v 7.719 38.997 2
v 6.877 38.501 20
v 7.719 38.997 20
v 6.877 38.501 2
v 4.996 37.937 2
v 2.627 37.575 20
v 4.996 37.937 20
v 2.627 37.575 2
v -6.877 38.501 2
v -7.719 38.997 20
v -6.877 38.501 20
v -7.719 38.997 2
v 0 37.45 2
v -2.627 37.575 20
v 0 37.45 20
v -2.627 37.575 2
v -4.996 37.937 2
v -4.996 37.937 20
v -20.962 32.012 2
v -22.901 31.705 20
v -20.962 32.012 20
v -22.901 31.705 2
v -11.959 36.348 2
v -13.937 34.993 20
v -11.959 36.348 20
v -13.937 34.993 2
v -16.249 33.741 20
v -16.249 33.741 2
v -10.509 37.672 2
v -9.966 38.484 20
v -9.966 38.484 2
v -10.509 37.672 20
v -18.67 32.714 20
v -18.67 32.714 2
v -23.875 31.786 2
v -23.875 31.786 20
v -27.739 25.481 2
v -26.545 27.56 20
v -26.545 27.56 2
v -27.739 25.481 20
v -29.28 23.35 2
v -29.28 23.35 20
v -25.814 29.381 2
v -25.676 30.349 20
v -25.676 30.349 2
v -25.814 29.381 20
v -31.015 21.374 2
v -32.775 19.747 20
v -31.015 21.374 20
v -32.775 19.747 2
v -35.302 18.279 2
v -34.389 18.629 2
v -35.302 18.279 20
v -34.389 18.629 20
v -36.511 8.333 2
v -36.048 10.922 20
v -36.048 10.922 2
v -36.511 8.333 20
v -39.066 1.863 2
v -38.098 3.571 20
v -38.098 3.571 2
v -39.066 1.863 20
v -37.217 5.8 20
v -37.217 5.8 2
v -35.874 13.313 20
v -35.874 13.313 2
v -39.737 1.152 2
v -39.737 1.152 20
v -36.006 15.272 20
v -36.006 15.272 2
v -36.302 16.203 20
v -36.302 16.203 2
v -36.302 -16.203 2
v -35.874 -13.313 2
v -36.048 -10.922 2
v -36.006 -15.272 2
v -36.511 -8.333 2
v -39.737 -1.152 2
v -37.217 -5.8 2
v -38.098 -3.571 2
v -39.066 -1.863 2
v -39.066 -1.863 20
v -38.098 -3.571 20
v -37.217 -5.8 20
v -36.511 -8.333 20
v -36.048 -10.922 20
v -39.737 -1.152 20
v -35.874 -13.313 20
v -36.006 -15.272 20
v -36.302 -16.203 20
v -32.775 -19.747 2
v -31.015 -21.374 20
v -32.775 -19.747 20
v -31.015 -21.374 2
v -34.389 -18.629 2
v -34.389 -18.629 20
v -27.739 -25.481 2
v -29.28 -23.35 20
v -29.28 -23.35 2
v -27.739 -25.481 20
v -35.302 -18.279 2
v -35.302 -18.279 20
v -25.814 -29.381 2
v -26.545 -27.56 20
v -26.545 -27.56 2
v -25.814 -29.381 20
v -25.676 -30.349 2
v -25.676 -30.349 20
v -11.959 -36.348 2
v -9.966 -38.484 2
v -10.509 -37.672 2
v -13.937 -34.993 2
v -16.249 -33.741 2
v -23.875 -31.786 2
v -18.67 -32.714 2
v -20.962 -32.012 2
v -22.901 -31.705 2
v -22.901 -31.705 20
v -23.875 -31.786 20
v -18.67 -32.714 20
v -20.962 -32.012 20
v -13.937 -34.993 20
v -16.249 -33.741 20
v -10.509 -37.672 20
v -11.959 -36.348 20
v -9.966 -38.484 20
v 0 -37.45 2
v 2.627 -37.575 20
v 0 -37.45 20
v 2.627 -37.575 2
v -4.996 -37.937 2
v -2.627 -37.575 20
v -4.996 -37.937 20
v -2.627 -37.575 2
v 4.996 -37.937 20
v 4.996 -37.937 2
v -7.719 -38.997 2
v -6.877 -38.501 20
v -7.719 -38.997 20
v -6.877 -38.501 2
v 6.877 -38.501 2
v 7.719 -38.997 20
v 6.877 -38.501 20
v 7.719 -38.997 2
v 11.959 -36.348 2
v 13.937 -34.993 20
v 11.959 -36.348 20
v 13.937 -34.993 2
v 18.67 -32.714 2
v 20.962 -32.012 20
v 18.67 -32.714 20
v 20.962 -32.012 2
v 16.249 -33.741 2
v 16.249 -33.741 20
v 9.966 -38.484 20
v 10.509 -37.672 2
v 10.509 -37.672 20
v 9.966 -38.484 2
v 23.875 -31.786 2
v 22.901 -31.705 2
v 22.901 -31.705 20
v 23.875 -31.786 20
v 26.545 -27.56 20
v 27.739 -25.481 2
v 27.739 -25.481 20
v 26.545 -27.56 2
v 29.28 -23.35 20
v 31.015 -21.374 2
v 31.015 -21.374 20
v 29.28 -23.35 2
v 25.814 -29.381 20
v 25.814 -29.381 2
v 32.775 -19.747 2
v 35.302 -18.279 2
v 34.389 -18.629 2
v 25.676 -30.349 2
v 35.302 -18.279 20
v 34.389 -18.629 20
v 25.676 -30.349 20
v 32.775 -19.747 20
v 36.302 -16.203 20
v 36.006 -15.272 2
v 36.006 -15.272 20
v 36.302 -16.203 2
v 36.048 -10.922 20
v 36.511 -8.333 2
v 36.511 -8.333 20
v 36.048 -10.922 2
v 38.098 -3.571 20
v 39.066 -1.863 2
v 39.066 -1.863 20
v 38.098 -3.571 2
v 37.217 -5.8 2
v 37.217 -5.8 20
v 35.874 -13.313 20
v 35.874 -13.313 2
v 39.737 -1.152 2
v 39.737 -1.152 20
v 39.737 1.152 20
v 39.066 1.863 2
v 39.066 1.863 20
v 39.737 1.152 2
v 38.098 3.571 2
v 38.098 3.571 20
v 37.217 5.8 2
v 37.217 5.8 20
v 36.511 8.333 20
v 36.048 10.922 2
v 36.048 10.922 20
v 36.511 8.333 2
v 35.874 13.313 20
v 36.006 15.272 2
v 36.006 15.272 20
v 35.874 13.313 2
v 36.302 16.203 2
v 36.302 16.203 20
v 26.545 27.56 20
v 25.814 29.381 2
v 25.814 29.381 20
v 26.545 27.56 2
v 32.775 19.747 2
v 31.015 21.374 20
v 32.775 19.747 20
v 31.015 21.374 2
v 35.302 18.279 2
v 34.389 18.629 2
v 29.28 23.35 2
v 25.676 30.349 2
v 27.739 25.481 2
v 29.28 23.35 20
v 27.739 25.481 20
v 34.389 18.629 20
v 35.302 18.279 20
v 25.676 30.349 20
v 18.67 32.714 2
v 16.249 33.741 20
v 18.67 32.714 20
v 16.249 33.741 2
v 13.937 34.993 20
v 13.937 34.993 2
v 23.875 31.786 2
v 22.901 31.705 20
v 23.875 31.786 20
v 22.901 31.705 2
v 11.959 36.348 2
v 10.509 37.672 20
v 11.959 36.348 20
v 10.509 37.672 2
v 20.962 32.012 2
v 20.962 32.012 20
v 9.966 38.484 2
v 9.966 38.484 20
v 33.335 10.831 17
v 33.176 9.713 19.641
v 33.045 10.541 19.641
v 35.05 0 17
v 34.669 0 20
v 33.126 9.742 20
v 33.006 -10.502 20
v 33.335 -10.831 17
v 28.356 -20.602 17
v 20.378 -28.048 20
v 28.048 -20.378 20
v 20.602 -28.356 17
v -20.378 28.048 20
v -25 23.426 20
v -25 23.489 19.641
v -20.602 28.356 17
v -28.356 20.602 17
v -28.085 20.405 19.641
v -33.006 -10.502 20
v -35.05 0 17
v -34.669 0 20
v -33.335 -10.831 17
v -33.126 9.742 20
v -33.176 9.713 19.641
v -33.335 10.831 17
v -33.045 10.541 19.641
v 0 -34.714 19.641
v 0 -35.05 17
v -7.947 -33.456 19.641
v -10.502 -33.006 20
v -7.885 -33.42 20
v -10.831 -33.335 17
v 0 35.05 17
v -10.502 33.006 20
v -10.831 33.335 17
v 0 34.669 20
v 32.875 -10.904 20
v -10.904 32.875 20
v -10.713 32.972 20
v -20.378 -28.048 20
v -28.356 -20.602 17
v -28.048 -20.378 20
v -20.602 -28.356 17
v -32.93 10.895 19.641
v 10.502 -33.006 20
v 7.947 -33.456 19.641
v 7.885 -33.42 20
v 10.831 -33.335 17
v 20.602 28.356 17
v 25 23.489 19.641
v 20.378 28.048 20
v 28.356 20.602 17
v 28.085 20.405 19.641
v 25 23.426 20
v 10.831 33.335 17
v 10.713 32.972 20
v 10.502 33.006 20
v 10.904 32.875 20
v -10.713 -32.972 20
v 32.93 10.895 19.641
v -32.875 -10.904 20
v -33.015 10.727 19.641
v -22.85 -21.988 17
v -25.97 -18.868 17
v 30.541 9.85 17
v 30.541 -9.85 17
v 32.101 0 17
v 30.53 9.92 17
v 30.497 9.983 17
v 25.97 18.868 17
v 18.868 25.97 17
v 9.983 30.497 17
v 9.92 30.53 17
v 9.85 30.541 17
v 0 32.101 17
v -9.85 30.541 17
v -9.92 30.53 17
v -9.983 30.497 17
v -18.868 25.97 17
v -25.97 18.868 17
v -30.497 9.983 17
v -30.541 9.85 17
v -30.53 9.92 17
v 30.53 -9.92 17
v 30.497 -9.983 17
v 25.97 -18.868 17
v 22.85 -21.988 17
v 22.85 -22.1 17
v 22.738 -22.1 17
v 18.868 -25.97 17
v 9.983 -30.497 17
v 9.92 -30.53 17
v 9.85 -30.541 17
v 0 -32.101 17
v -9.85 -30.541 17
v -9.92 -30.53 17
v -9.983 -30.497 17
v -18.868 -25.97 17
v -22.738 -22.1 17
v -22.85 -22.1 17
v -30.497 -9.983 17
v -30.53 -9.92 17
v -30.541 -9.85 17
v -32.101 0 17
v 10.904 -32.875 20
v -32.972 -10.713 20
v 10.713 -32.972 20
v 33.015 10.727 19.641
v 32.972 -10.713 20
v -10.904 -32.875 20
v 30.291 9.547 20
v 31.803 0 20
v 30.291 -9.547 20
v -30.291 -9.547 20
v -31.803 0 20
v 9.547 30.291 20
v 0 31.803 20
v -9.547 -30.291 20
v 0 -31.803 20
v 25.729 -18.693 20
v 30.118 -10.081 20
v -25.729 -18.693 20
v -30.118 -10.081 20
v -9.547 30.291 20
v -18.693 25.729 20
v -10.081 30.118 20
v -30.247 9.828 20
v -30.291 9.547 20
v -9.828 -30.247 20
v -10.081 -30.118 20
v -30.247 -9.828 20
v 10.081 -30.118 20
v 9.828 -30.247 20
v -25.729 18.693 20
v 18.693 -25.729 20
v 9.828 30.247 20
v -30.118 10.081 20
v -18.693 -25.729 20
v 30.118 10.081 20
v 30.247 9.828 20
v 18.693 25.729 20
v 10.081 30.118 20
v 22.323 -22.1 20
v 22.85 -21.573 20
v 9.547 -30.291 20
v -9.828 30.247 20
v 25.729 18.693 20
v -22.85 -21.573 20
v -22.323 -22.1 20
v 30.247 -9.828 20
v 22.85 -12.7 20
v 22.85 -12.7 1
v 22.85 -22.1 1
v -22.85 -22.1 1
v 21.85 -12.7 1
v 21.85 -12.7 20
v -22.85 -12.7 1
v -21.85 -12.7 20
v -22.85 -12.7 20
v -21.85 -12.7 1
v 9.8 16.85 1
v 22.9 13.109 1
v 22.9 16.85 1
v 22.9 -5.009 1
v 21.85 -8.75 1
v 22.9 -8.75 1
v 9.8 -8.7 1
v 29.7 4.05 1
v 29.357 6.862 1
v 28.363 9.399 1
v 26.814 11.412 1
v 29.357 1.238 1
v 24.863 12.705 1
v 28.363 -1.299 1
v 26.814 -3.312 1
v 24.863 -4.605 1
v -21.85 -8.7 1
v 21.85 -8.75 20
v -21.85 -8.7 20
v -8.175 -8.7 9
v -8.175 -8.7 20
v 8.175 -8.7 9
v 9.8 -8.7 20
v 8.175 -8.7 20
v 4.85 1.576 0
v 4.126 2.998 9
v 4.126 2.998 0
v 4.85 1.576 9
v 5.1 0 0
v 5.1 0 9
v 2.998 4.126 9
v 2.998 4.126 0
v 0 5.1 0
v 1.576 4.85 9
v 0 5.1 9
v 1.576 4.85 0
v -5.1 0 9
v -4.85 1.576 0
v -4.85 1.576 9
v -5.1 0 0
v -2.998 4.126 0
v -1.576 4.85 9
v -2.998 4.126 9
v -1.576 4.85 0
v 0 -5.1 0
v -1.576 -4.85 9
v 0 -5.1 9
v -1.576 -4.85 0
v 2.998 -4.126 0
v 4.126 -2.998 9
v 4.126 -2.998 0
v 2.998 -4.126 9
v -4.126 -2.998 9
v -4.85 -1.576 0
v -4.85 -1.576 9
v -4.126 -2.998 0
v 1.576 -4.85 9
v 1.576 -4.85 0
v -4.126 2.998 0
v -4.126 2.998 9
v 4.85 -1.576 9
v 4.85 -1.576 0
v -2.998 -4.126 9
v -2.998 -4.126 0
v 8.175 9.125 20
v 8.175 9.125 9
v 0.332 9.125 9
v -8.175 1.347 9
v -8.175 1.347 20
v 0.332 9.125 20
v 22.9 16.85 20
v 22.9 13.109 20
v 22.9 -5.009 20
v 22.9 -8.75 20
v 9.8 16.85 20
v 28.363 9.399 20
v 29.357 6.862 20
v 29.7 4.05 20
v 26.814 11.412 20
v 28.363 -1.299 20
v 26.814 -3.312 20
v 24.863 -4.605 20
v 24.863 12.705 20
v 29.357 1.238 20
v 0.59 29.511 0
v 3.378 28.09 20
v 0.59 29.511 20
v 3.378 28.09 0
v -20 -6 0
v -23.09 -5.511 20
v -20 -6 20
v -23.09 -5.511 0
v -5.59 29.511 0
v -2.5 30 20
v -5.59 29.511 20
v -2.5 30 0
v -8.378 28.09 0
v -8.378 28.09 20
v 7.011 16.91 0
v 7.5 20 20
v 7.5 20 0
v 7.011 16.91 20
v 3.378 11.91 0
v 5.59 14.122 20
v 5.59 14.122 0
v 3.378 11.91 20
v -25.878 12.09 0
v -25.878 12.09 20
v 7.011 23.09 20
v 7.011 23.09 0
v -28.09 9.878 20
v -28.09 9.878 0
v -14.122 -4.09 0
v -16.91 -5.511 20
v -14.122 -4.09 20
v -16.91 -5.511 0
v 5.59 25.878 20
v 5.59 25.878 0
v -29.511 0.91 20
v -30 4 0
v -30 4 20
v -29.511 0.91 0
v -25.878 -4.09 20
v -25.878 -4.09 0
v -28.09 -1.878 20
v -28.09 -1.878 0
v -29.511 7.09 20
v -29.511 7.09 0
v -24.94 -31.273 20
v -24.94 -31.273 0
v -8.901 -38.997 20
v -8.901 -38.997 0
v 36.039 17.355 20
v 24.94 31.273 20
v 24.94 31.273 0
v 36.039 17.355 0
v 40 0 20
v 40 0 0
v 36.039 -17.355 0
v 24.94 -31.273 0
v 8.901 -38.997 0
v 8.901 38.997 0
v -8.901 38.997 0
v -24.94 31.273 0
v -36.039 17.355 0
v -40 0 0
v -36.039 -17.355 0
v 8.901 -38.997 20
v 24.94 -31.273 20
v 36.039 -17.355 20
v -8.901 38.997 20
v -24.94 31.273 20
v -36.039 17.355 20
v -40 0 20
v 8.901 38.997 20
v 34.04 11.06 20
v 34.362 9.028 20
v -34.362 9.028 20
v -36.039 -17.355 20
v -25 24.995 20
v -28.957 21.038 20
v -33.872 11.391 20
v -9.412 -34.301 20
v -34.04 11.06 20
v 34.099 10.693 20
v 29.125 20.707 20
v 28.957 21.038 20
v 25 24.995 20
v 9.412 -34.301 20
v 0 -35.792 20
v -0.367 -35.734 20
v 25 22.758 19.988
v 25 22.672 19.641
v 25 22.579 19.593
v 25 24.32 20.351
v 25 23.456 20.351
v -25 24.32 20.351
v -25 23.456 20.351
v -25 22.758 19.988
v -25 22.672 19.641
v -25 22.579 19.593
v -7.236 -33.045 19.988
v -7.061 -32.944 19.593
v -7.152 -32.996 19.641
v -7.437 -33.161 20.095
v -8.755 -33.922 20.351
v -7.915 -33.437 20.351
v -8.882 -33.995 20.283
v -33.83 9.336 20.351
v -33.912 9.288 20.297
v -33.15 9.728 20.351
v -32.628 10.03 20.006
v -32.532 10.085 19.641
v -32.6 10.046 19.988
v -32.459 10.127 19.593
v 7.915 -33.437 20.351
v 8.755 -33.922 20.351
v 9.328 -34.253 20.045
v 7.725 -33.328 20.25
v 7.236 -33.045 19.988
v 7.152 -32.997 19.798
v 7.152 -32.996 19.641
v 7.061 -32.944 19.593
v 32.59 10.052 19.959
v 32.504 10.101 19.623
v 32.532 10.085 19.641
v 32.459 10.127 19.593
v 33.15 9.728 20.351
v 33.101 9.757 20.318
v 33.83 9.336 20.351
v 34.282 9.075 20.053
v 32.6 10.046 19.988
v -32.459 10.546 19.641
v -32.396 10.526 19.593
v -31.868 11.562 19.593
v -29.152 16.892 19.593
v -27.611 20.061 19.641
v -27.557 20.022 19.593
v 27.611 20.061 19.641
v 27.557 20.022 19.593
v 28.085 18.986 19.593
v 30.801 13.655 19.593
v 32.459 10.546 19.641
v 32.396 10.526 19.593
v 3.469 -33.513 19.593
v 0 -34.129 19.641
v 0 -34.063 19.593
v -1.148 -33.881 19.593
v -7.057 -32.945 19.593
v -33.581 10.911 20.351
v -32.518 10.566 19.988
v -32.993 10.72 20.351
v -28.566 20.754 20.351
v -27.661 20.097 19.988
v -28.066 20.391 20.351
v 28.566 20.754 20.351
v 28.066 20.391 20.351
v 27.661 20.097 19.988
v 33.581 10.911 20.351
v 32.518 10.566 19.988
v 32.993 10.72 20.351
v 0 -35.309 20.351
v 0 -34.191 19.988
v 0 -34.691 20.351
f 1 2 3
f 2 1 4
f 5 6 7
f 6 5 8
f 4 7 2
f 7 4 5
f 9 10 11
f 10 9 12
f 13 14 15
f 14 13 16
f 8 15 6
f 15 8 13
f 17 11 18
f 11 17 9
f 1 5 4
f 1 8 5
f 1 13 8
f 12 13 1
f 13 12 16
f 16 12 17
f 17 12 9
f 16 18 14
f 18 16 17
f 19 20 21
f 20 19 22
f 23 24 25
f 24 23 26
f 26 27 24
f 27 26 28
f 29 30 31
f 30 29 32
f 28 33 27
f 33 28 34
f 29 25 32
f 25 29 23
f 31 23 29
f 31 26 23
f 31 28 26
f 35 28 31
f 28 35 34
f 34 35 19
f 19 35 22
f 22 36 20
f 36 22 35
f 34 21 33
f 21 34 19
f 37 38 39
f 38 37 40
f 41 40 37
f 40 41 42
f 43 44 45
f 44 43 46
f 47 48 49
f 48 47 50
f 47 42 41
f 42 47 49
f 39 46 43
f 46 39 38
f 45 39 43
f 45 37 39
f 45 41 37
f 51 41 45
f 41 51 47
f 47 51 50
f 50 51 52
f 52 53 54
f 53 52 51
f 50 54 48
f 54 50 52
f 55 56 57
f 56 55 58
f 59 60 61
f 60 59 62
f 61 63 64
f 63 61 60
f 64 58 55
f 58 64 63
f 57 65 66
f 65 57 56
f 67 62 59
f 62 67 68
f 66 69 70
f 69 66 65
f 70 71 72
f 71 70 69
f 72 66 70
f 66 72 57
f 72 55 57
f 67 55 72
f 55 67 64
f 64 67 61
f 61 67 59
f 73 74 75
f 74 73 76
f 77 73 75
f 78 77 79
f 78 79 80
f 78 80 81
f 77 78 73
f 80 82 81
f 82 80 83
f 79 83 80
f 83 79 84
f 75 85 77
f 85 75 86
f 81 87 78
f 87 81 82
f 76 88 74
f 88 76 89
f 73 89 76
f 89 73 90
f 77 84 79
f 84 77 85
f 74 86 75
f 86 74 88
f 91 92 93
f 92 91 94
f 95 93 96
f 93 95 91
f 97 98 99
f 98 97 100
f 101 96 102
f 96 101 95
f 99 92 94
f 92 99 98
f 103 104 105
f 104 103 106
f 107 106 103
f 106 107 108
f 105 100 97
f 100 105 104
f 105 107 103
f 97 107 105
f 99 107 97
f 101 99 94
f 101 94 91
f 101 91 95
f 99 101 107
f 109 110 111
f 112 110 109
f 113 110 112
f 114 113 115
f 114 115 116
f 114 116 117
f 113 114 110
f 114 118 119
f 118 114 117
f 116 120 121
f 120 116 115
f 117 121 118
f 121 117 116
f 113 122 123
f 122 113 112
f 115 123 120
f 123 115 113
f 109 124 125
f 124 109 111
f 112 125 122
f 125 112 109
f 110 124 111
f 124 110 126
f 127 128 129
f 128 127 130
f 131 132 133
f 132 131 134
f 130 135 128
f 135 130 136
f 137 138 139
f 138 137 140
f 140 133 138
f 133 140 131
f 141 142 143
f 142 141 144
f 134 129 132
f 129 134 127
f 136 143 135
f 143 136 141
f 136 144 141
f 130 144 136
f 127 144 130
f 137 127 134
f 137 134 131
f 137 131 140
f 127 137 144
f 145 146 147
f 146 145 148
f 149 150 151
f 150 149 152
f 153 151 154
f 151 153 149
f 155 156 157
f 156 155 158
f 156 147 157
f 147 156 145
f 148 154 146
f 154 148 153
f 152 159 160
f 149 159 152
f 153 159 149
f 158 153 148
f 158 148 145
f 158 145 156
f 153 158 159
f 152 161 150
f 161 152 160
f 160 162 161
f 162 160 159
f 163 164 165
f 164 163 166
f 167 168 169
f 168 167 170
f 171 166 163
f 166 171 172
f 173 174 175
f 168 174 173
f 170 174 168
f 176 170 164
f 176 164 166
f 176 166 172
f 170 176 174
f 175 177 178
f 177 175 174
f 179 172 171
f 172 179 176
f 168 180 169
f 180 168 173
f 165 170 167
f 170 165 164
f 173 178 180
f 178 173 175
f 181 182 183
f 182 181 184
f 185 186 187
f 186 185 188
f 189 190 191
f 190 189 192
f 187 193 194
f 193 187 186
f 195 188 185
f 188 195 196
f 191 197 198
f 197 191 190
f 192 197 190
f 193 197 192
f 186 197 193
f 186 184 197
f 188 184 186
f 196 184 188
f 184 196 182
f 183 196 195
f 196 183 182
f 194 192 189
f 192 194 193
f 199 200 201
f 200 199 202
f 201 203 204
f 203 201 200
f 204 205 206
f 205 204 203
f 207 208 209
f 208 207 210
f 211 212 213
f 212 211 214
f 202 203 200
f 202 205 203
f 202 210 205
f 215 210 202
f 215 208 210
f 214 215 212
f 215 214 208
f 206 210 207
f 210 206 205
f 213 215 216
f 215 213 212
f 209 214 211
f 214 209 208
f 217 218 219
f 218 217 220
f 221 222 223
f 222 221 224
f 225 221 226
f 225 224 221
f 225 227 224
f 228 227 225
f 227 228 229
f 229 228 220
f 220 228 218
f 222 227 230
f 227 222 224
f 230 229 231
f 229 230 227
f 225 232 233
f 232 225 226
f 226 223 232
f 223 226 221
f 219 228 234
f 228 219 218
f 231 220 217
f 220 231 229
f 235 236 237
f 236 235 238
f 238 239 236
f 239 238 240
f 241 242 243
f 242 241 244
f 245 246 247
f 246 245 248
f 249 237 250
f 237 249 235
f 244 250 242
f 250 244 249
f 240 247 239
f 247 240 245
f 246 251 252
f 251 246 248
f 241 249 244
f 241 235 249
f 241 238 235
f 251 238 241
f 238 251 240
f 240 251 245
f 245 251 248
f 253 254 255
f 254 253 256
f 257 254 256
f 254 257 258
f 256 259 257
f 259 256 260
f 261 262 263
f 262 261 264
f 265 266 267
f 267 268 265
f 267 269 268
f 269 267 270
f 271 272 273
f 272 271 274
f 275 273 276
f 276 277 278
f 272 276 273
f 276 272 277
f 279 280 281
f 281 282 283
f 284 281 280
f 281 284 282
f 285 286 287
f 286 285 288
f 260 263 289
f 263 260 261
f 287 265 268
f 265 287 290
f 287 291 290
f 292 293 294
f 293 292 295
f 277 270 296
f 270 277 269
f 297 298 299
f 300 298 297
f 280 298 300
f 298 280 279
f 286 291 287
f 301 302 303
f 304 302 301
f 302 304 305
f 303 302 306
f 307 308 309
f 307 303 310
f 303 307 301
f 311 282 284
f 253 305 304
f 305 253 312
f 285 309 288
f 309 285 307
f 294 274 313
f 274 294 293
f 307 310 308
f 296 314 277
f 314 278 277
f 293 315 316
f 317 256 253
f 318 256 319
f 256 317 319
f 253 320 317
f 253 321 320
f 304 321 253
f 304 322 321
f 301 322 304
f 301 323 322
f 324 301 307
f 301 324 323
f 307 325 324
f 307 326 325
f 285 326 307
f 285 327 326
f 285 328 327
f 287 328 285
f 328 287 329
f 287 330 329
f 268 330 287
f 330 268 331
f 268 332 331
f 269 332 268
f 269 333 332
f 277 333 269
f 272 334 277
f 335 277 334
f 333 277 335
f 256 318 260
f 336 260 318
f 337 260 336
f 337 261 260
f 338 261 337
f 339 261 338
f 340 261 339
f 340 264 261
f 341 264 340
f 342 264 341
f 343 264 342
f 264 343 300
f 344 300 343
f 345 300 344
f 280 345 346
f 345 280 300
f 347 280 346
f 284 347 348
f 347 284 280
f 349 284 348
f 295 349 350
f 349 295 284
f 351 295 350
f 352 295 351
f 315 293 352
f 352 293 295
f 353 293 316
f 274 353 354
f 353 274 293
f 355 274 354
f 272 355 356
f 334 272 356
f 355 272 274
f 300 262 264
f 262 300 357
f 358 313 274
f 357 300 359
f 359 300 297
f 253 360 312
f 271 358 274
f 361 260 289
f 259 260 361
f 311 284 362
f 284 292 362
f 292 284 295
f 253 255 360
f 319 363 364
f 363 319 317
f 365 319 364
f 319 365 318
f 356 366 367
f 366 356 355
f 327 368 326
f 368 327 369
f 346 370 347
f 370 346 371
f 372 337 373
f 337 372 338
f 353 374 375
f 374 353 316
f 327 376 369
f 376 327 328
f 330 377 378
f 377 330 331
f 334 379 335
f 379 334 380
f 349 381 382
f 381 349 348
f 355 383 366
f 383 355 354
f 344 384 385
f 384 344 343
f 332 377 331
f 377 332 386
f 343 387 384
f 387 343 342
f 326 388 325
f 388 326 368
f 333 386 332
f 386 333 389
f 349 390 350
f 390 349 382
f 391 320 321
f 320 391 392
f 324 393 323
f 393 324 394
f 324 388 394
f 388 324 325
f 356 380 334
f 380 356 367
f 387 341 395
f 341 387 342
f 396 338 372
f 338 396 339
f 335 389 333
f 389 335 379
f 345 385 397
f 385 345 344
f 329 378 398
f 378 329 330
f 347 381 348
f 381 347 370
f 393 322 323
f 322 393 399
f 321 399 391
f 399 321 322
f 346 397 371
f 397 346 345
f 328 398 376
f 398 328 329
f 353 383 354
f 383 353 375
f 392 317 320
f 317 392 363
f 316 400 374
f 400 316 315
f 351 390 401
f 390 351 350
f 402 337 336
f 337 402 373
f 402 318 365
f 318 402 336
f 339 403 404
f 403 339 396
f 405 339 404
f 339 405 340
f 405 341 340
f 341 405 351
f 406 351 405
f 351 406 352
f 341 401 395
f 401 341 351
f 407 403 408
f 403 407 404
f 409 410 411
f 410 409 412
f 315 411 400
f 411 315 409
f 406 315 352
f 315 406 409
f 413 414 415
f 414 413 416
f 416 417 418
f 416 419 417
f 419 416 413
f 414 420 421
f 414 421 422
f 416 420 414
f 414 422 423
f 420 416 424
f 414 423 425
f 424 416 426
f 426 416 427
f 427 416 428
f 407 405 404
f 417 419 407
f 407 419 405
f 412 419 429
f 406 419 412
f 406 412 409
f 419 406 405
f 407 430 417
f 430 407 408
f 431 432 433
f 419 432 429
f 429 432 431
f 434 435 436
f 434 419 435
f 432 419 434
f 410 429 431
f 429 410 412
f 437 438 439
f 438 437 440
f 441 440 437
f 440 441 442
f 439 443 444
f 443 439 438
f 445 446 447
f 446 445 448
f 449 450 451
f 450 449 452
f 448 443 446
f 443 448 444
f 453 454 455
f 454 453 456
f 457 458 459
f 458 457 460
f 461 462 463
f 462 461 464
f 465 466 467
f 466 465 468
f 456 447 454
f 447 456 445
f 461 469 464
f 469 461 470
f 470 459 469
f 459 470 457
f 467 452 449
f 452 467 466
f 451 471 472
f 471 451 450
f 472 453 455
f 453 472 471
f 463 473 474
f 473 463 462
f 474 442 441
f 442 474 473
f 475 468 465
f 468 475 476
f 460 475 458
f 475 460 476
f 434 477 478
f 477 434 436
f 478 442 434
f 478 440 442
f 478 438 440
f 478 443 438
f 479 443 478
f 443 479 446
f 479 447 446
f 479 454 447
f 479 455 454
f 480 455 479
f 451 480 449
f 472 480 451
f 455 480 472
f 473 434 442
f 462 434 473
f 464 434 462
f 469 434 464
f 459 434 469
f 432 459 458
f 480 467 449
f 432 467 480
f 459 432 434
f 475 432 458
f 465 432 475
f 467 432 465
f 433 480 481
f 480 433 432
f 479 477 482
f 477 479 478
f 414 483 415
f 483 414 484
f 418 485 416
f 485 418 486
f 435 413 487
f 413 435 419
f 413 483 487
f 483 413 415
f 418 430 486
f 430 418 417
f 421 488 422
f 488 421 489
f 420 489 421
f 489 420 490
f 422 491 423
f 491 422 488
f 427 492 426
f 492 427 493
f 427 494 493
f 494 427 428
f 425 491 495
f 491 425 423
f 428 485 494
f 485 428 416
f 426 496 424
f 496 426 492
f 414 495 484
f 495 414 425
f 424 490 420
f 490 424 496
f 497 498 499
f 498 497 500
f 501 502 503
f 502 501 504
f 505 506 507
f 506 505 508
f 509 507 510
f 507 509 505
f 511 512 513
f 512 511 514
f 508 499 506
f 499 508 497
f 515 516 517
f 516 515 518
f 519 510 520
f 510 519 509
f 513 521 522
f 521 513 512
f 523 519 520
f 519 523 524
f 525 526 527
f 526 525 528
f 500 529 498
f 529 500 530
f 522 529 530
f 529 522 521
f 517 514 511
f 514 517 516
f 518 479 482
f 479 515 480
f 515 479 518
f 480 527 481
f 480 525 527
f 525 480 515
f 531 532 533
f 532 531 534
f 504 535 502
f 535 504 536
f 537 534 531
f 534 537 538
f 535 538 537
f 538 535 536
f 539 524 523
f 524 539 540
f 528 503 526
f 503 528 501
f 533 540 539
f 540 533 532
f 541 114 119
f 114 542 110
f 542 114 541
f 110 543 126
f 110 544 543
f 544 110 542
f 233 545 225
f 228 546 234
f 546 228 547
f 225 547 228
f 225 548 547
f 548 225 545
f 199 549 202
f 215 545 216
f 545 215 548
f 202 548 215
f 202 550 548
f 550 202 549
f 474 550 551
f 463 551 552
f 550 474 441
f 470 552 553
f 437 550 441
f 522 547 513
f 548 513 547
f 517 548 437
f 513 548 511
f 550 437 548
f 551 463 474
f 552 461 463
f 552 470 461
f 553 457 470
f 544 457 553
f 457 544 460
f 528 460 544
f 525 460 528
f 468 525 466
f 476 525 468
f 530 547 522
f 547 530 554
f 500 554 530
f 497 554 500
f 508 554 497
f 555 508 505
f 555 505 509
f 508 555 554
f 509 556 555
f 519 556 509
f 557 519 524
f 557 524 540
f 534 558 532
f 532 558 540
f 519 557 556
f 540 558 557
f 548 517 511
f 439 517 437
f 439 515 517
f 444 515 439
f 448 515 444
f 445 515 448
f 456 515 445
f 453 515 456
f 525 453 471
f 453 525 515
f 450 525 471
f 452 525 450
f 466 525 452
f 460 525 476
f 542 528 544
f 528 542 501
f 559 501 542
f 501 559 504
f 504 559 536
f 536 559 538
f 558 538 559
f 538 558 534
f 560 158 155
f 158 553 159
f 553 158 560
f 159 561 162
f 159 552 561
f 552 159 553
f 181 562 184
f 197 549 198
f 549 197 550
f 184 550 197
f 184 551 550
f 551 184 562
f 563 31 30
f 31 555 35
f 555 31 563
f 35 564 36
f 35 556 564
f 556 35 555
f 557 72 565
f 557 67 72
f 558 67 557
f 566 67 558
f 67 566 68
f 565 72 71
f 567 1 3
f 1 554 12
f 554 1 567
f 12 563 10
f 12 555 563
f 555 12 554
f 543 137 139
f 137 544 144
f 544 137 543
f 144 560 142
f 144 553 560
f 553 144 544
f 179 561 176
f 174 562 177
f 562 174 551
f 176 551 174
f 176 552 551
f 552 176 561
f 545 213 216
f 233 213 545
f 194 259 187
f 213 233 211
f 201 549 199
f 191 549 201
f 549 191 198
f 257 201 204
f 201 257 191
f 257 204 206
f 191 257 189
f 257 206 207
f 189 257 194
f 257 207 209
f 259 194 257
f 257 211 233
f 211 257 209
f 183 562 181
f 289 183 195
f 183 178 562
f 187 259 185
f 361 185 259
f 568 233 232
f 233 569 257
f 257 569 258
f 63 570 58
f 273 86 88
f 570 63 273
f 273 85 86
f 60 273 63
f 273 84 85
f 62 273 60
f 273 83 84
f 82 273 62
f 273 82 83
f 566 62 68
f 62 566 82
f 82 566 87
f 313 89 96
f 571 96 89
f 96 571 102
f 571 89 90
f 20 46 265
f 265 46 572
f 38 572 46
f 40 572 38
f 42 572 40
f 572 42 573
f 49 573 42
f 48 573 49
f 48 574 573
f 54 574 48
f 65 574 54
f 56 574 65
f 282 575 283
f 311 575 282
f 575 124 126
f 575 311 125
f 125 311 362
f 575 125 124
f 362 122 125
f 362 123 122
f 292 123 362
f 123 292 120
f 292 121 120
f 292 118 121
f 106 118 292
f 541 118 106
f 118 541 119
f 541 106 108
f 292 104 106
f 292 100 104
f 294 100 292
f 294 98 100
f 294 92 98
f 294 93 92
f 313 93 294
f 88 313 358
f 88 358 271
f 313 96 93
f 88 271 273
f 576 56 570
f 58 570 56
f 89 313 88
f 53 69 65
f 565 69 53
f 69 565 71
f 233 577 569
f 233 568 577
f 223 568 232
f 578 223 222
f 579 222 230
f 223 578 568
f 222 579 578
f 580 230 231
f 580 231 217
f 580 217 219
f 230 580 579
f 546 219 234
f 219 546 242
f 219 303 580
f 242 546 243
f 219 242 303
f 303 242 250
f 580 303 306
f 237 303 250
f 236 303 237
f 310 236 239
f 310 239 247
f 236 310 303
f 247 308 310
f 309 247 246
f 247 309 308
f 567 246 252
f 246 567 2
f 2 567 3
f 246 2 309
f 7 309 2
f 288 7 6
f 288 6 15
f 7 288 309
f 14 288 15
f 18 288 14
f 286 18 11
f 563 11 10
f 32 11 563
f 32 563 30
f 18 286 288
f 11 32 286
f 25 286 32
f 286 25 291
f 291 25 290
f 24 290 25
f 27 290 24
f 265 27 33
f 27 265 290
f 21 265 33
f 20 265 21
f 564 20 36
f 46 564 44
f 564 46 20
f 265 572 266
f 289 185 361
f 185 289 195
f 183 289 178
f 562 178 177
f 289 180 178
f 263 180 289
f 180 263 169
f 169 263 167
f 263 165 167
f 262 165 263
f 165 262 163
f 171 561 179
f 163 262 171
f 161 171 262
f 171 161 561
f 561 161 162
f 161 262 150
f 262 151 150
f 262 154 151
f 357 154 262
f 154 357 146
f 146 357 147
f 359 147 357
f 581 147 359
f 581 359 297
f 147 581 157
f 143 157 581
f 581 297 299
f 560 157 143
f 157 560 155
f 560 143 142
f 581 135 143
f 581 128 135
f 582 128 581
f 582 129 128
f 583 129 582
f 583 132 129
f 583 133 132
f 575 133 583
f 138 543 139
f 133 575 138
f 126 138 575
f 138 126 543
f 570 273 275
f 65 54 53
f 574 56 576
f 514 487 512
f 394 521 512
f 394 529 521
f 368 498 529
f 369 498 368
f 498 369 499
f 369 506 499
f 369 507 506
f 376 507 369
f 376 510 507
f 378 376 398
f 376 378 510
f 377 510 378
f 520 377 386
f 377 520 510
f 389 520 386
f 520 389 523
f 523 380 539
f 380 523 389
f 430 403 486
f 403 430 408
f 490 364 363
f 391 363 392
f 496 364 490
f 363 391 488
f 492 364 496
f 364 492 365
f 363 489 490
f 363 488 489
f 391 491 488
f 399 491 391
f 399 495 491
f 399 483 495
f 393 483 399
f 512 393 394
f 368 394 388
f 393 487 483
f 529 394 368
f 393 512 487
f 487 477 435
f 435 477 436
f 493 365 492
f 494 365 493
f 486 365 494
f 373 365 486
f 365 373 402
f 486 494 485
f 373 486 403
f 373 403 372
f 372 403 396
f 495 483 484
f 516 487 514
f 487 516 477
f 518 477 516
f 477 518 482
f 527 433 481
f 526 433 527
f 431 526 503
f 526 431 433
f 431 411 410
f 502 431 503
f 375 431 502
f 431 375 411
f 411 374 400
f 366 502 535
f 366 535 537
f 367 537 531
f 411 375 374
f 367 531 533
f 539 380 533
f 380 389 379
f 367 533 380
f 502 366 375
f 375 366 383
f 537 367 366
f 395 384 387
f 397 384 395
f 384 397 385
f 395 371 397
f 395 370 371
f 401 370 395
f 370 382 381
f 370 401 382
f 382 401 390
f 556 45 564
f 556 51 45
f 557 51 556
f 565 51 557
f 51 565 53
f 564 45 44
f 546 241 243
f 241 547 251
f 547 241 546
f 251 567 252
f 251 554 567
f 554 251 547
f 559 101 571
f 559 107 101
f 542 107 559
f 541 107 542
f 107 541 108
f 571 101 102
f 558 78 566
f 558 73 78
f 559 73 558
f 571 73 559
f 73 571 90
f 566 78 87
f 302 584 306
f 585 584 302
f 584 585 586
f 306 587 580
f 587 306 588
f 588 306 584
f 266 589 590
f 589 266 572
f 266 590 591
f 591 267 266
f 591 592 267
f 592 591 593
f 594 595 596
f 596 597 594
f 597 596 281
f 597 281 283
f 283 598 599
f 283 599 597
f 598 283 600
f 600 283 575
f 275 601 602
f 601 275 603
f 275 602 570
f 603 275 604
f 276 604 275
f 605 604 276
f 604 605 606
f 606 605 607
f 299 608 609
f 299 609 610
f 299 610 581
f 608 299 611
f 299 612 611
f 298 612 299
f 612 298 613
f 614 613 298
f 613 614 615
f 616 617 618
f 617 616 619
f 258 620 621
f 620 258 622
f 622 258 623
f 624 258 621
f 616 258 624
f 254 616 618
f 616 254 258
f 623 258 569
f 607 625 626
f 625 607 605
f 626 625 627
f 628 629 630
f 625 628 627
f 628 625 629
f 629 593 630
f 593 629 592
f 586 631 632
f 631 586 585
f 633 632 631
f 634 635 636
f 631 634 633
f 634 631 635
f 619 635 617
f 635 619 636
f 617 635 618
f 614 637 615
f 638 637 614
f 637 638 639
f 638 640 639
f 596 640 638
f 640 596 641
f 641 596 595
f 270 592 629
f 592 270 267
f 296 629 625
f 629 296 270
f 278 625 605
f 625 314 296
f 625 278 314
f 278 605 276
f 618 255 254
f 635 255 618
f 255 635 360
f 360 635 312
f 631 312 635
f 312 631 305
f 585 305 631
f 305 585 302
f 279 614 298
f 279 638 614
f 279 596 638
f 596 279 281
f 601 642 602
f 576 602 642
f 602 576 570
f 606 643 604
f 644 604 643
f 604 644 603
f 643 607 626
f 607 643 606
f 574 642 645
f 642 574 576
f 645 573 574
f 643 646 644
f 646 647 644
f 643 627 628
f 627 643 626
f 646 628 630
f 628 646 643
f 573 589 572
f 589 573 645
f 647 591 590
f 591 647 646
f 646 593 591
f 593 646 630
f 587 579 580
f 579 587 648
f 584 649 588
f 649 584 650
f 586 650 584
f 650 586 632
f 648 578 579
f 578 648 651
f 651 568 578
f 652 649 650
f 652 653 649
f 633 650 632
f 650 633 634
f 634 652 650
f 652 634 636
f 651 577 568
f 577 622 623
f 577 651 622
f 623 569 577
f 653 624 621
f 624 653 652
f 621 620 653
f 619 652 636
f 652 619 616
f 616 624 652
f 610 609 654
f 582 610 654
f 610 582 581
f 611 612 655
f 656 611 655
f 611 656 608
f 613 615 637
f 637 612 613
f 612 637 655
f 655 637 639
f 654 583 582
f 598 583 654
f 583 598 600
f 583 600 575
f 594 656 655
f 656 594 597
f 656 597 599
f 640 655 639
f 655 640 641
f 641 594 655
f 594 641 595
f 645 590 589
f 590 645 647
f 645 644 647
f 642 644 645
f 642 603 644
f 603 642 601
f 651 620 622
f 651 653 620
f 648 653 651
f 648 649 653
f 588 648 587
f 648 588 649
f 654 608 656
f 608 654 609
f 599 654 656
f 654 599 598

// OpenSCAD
//Définition globale (augmenter pour l'exportation ~100-200)
def = 20;
//Définition des ergots
def2 = 10;

//Molette
facettes = 14;

//Caractéristiques du gobelets
d1 = 70.1; //Diamètre de la grande base du tronc
d2 = 45; //Diamètre de la petite base
h = 98.8; //Hauteur du tronc de cône
ep = 5.7; //Épaisseur approximative de la collerette du gobelet

//Afficher les différents modules séparément
//gobelet();
//breadboard();
//potentiometre();
//piles();
//molette();
final();

module gobelet(){
      color([1, 1, 1])
      difference(){   
            //Partie extérieure
            cylinder(d1=d1, d2=d2, h=h, $fn=def);
            //Partie intérieure
            translate([0, 0, -1]) cylinder(d1=d1-ep, d2=d2-0.2, h=h, $fn=def);
      }
}

module breadboard(){
      color([1, 0, 0])
      union(){
            cube([45.7, 34.6, 9.4]);
            //Petite avancée pour le passage des composants et fils
            translate([1, 0, -4]) cube([43.7, 34.6, 4.1]); 
      }
}

module potentiometre(){
      color([0, 1, 0])
      union(){
            translate([0, 0, -1]) cylinder(d1=10.2, d2=10.2, h=22, $fn=def);
            translate([0, 0, 13.72/2+9]) cube([16.35, 18.25, 13.72], center = true);
      }
}
      
module piles(){
      color([0, 0, 1])
      union(){
            cube([13.1, 25.6, 53]);
            translate([12.9, 25.6/2, 0]) scale([1, 1.3, 1]) cylinder(d1=14, d2=14, h=53, $fn=def);
      }
}


module molette(){
      color([0.5, 0.5, 0.5])
      difference(){
      
            //Cylindre de base
            cylinder(d1=80, d2=80, h=20, $fn=facettes);        
            //Soustraction...
            union(){
                  
                  //Des crans de la molette
                  for (a =[0:facettes-1]){        
                        rotate([0, 0, a*(360/facettes)]) translate([0, 77/2+1.5, 2]) scale([1, 0.3,1]) cylinder(d1=17, d2=17, h=22, $fn=def);
                  }
            
                  //Du gobelet
                  translate([0, 0, 17]) gobelet();
                  
                  //De la breadboard
                  rotate([90, 0, 0]) translate([-45.7/2, 1, 12.7]) breadboard();
                  
                  //Du potentiomètre
                  potentiometre();
                  
                  //Du porte-pile
                  translate([9.8, -8.75, 1]) piles();
                  
                  //D'un trou dans la zone pleine pour utiliser moins de plastique et réduire le temps d'impression 3D
                  hull(){
                        translate([-20, 4, -1]) cylinder(d1=20, d2=20, h=22, $fn=def);
                        translate([-2.5, 20, -1]) cylinder(d1=20, d2=20, h=22, $fn=def);
                  }       
            }//Union        
      }//Difference     
}

module final(){
      //Ajout de trois ergots à la molette         
      union(){
            color([0.5, 0.5, 0.5])
            molette();
            
            color([1, 1, 1])
            difference(){
                  //Anneau
                  translate([0, 0, 19.4]) rotate_extrude(convexity = 10, $fn=def) translate([77/2 - 3.5, 0, 0]) circle(r = 1, $fn=def2);
                  
                  //Soustraction...
                  union(){
                        //Du même anneau vers le bas
                        translate([0, 0, 18.5]) rotate_extrude(convexity = 10, $fn=def) translate([77/2-4, 0, 0]) circle(r = 1.2, $fn=def2);
                        //De trois portions
                        for (a =[0:2]){
                              rotate([0, 0, a*120]) translate([0, 20, 20]) cube([50, 40, 10], center = true);
                        }
                  }//Union
            }//Difference
      }//Union
}
